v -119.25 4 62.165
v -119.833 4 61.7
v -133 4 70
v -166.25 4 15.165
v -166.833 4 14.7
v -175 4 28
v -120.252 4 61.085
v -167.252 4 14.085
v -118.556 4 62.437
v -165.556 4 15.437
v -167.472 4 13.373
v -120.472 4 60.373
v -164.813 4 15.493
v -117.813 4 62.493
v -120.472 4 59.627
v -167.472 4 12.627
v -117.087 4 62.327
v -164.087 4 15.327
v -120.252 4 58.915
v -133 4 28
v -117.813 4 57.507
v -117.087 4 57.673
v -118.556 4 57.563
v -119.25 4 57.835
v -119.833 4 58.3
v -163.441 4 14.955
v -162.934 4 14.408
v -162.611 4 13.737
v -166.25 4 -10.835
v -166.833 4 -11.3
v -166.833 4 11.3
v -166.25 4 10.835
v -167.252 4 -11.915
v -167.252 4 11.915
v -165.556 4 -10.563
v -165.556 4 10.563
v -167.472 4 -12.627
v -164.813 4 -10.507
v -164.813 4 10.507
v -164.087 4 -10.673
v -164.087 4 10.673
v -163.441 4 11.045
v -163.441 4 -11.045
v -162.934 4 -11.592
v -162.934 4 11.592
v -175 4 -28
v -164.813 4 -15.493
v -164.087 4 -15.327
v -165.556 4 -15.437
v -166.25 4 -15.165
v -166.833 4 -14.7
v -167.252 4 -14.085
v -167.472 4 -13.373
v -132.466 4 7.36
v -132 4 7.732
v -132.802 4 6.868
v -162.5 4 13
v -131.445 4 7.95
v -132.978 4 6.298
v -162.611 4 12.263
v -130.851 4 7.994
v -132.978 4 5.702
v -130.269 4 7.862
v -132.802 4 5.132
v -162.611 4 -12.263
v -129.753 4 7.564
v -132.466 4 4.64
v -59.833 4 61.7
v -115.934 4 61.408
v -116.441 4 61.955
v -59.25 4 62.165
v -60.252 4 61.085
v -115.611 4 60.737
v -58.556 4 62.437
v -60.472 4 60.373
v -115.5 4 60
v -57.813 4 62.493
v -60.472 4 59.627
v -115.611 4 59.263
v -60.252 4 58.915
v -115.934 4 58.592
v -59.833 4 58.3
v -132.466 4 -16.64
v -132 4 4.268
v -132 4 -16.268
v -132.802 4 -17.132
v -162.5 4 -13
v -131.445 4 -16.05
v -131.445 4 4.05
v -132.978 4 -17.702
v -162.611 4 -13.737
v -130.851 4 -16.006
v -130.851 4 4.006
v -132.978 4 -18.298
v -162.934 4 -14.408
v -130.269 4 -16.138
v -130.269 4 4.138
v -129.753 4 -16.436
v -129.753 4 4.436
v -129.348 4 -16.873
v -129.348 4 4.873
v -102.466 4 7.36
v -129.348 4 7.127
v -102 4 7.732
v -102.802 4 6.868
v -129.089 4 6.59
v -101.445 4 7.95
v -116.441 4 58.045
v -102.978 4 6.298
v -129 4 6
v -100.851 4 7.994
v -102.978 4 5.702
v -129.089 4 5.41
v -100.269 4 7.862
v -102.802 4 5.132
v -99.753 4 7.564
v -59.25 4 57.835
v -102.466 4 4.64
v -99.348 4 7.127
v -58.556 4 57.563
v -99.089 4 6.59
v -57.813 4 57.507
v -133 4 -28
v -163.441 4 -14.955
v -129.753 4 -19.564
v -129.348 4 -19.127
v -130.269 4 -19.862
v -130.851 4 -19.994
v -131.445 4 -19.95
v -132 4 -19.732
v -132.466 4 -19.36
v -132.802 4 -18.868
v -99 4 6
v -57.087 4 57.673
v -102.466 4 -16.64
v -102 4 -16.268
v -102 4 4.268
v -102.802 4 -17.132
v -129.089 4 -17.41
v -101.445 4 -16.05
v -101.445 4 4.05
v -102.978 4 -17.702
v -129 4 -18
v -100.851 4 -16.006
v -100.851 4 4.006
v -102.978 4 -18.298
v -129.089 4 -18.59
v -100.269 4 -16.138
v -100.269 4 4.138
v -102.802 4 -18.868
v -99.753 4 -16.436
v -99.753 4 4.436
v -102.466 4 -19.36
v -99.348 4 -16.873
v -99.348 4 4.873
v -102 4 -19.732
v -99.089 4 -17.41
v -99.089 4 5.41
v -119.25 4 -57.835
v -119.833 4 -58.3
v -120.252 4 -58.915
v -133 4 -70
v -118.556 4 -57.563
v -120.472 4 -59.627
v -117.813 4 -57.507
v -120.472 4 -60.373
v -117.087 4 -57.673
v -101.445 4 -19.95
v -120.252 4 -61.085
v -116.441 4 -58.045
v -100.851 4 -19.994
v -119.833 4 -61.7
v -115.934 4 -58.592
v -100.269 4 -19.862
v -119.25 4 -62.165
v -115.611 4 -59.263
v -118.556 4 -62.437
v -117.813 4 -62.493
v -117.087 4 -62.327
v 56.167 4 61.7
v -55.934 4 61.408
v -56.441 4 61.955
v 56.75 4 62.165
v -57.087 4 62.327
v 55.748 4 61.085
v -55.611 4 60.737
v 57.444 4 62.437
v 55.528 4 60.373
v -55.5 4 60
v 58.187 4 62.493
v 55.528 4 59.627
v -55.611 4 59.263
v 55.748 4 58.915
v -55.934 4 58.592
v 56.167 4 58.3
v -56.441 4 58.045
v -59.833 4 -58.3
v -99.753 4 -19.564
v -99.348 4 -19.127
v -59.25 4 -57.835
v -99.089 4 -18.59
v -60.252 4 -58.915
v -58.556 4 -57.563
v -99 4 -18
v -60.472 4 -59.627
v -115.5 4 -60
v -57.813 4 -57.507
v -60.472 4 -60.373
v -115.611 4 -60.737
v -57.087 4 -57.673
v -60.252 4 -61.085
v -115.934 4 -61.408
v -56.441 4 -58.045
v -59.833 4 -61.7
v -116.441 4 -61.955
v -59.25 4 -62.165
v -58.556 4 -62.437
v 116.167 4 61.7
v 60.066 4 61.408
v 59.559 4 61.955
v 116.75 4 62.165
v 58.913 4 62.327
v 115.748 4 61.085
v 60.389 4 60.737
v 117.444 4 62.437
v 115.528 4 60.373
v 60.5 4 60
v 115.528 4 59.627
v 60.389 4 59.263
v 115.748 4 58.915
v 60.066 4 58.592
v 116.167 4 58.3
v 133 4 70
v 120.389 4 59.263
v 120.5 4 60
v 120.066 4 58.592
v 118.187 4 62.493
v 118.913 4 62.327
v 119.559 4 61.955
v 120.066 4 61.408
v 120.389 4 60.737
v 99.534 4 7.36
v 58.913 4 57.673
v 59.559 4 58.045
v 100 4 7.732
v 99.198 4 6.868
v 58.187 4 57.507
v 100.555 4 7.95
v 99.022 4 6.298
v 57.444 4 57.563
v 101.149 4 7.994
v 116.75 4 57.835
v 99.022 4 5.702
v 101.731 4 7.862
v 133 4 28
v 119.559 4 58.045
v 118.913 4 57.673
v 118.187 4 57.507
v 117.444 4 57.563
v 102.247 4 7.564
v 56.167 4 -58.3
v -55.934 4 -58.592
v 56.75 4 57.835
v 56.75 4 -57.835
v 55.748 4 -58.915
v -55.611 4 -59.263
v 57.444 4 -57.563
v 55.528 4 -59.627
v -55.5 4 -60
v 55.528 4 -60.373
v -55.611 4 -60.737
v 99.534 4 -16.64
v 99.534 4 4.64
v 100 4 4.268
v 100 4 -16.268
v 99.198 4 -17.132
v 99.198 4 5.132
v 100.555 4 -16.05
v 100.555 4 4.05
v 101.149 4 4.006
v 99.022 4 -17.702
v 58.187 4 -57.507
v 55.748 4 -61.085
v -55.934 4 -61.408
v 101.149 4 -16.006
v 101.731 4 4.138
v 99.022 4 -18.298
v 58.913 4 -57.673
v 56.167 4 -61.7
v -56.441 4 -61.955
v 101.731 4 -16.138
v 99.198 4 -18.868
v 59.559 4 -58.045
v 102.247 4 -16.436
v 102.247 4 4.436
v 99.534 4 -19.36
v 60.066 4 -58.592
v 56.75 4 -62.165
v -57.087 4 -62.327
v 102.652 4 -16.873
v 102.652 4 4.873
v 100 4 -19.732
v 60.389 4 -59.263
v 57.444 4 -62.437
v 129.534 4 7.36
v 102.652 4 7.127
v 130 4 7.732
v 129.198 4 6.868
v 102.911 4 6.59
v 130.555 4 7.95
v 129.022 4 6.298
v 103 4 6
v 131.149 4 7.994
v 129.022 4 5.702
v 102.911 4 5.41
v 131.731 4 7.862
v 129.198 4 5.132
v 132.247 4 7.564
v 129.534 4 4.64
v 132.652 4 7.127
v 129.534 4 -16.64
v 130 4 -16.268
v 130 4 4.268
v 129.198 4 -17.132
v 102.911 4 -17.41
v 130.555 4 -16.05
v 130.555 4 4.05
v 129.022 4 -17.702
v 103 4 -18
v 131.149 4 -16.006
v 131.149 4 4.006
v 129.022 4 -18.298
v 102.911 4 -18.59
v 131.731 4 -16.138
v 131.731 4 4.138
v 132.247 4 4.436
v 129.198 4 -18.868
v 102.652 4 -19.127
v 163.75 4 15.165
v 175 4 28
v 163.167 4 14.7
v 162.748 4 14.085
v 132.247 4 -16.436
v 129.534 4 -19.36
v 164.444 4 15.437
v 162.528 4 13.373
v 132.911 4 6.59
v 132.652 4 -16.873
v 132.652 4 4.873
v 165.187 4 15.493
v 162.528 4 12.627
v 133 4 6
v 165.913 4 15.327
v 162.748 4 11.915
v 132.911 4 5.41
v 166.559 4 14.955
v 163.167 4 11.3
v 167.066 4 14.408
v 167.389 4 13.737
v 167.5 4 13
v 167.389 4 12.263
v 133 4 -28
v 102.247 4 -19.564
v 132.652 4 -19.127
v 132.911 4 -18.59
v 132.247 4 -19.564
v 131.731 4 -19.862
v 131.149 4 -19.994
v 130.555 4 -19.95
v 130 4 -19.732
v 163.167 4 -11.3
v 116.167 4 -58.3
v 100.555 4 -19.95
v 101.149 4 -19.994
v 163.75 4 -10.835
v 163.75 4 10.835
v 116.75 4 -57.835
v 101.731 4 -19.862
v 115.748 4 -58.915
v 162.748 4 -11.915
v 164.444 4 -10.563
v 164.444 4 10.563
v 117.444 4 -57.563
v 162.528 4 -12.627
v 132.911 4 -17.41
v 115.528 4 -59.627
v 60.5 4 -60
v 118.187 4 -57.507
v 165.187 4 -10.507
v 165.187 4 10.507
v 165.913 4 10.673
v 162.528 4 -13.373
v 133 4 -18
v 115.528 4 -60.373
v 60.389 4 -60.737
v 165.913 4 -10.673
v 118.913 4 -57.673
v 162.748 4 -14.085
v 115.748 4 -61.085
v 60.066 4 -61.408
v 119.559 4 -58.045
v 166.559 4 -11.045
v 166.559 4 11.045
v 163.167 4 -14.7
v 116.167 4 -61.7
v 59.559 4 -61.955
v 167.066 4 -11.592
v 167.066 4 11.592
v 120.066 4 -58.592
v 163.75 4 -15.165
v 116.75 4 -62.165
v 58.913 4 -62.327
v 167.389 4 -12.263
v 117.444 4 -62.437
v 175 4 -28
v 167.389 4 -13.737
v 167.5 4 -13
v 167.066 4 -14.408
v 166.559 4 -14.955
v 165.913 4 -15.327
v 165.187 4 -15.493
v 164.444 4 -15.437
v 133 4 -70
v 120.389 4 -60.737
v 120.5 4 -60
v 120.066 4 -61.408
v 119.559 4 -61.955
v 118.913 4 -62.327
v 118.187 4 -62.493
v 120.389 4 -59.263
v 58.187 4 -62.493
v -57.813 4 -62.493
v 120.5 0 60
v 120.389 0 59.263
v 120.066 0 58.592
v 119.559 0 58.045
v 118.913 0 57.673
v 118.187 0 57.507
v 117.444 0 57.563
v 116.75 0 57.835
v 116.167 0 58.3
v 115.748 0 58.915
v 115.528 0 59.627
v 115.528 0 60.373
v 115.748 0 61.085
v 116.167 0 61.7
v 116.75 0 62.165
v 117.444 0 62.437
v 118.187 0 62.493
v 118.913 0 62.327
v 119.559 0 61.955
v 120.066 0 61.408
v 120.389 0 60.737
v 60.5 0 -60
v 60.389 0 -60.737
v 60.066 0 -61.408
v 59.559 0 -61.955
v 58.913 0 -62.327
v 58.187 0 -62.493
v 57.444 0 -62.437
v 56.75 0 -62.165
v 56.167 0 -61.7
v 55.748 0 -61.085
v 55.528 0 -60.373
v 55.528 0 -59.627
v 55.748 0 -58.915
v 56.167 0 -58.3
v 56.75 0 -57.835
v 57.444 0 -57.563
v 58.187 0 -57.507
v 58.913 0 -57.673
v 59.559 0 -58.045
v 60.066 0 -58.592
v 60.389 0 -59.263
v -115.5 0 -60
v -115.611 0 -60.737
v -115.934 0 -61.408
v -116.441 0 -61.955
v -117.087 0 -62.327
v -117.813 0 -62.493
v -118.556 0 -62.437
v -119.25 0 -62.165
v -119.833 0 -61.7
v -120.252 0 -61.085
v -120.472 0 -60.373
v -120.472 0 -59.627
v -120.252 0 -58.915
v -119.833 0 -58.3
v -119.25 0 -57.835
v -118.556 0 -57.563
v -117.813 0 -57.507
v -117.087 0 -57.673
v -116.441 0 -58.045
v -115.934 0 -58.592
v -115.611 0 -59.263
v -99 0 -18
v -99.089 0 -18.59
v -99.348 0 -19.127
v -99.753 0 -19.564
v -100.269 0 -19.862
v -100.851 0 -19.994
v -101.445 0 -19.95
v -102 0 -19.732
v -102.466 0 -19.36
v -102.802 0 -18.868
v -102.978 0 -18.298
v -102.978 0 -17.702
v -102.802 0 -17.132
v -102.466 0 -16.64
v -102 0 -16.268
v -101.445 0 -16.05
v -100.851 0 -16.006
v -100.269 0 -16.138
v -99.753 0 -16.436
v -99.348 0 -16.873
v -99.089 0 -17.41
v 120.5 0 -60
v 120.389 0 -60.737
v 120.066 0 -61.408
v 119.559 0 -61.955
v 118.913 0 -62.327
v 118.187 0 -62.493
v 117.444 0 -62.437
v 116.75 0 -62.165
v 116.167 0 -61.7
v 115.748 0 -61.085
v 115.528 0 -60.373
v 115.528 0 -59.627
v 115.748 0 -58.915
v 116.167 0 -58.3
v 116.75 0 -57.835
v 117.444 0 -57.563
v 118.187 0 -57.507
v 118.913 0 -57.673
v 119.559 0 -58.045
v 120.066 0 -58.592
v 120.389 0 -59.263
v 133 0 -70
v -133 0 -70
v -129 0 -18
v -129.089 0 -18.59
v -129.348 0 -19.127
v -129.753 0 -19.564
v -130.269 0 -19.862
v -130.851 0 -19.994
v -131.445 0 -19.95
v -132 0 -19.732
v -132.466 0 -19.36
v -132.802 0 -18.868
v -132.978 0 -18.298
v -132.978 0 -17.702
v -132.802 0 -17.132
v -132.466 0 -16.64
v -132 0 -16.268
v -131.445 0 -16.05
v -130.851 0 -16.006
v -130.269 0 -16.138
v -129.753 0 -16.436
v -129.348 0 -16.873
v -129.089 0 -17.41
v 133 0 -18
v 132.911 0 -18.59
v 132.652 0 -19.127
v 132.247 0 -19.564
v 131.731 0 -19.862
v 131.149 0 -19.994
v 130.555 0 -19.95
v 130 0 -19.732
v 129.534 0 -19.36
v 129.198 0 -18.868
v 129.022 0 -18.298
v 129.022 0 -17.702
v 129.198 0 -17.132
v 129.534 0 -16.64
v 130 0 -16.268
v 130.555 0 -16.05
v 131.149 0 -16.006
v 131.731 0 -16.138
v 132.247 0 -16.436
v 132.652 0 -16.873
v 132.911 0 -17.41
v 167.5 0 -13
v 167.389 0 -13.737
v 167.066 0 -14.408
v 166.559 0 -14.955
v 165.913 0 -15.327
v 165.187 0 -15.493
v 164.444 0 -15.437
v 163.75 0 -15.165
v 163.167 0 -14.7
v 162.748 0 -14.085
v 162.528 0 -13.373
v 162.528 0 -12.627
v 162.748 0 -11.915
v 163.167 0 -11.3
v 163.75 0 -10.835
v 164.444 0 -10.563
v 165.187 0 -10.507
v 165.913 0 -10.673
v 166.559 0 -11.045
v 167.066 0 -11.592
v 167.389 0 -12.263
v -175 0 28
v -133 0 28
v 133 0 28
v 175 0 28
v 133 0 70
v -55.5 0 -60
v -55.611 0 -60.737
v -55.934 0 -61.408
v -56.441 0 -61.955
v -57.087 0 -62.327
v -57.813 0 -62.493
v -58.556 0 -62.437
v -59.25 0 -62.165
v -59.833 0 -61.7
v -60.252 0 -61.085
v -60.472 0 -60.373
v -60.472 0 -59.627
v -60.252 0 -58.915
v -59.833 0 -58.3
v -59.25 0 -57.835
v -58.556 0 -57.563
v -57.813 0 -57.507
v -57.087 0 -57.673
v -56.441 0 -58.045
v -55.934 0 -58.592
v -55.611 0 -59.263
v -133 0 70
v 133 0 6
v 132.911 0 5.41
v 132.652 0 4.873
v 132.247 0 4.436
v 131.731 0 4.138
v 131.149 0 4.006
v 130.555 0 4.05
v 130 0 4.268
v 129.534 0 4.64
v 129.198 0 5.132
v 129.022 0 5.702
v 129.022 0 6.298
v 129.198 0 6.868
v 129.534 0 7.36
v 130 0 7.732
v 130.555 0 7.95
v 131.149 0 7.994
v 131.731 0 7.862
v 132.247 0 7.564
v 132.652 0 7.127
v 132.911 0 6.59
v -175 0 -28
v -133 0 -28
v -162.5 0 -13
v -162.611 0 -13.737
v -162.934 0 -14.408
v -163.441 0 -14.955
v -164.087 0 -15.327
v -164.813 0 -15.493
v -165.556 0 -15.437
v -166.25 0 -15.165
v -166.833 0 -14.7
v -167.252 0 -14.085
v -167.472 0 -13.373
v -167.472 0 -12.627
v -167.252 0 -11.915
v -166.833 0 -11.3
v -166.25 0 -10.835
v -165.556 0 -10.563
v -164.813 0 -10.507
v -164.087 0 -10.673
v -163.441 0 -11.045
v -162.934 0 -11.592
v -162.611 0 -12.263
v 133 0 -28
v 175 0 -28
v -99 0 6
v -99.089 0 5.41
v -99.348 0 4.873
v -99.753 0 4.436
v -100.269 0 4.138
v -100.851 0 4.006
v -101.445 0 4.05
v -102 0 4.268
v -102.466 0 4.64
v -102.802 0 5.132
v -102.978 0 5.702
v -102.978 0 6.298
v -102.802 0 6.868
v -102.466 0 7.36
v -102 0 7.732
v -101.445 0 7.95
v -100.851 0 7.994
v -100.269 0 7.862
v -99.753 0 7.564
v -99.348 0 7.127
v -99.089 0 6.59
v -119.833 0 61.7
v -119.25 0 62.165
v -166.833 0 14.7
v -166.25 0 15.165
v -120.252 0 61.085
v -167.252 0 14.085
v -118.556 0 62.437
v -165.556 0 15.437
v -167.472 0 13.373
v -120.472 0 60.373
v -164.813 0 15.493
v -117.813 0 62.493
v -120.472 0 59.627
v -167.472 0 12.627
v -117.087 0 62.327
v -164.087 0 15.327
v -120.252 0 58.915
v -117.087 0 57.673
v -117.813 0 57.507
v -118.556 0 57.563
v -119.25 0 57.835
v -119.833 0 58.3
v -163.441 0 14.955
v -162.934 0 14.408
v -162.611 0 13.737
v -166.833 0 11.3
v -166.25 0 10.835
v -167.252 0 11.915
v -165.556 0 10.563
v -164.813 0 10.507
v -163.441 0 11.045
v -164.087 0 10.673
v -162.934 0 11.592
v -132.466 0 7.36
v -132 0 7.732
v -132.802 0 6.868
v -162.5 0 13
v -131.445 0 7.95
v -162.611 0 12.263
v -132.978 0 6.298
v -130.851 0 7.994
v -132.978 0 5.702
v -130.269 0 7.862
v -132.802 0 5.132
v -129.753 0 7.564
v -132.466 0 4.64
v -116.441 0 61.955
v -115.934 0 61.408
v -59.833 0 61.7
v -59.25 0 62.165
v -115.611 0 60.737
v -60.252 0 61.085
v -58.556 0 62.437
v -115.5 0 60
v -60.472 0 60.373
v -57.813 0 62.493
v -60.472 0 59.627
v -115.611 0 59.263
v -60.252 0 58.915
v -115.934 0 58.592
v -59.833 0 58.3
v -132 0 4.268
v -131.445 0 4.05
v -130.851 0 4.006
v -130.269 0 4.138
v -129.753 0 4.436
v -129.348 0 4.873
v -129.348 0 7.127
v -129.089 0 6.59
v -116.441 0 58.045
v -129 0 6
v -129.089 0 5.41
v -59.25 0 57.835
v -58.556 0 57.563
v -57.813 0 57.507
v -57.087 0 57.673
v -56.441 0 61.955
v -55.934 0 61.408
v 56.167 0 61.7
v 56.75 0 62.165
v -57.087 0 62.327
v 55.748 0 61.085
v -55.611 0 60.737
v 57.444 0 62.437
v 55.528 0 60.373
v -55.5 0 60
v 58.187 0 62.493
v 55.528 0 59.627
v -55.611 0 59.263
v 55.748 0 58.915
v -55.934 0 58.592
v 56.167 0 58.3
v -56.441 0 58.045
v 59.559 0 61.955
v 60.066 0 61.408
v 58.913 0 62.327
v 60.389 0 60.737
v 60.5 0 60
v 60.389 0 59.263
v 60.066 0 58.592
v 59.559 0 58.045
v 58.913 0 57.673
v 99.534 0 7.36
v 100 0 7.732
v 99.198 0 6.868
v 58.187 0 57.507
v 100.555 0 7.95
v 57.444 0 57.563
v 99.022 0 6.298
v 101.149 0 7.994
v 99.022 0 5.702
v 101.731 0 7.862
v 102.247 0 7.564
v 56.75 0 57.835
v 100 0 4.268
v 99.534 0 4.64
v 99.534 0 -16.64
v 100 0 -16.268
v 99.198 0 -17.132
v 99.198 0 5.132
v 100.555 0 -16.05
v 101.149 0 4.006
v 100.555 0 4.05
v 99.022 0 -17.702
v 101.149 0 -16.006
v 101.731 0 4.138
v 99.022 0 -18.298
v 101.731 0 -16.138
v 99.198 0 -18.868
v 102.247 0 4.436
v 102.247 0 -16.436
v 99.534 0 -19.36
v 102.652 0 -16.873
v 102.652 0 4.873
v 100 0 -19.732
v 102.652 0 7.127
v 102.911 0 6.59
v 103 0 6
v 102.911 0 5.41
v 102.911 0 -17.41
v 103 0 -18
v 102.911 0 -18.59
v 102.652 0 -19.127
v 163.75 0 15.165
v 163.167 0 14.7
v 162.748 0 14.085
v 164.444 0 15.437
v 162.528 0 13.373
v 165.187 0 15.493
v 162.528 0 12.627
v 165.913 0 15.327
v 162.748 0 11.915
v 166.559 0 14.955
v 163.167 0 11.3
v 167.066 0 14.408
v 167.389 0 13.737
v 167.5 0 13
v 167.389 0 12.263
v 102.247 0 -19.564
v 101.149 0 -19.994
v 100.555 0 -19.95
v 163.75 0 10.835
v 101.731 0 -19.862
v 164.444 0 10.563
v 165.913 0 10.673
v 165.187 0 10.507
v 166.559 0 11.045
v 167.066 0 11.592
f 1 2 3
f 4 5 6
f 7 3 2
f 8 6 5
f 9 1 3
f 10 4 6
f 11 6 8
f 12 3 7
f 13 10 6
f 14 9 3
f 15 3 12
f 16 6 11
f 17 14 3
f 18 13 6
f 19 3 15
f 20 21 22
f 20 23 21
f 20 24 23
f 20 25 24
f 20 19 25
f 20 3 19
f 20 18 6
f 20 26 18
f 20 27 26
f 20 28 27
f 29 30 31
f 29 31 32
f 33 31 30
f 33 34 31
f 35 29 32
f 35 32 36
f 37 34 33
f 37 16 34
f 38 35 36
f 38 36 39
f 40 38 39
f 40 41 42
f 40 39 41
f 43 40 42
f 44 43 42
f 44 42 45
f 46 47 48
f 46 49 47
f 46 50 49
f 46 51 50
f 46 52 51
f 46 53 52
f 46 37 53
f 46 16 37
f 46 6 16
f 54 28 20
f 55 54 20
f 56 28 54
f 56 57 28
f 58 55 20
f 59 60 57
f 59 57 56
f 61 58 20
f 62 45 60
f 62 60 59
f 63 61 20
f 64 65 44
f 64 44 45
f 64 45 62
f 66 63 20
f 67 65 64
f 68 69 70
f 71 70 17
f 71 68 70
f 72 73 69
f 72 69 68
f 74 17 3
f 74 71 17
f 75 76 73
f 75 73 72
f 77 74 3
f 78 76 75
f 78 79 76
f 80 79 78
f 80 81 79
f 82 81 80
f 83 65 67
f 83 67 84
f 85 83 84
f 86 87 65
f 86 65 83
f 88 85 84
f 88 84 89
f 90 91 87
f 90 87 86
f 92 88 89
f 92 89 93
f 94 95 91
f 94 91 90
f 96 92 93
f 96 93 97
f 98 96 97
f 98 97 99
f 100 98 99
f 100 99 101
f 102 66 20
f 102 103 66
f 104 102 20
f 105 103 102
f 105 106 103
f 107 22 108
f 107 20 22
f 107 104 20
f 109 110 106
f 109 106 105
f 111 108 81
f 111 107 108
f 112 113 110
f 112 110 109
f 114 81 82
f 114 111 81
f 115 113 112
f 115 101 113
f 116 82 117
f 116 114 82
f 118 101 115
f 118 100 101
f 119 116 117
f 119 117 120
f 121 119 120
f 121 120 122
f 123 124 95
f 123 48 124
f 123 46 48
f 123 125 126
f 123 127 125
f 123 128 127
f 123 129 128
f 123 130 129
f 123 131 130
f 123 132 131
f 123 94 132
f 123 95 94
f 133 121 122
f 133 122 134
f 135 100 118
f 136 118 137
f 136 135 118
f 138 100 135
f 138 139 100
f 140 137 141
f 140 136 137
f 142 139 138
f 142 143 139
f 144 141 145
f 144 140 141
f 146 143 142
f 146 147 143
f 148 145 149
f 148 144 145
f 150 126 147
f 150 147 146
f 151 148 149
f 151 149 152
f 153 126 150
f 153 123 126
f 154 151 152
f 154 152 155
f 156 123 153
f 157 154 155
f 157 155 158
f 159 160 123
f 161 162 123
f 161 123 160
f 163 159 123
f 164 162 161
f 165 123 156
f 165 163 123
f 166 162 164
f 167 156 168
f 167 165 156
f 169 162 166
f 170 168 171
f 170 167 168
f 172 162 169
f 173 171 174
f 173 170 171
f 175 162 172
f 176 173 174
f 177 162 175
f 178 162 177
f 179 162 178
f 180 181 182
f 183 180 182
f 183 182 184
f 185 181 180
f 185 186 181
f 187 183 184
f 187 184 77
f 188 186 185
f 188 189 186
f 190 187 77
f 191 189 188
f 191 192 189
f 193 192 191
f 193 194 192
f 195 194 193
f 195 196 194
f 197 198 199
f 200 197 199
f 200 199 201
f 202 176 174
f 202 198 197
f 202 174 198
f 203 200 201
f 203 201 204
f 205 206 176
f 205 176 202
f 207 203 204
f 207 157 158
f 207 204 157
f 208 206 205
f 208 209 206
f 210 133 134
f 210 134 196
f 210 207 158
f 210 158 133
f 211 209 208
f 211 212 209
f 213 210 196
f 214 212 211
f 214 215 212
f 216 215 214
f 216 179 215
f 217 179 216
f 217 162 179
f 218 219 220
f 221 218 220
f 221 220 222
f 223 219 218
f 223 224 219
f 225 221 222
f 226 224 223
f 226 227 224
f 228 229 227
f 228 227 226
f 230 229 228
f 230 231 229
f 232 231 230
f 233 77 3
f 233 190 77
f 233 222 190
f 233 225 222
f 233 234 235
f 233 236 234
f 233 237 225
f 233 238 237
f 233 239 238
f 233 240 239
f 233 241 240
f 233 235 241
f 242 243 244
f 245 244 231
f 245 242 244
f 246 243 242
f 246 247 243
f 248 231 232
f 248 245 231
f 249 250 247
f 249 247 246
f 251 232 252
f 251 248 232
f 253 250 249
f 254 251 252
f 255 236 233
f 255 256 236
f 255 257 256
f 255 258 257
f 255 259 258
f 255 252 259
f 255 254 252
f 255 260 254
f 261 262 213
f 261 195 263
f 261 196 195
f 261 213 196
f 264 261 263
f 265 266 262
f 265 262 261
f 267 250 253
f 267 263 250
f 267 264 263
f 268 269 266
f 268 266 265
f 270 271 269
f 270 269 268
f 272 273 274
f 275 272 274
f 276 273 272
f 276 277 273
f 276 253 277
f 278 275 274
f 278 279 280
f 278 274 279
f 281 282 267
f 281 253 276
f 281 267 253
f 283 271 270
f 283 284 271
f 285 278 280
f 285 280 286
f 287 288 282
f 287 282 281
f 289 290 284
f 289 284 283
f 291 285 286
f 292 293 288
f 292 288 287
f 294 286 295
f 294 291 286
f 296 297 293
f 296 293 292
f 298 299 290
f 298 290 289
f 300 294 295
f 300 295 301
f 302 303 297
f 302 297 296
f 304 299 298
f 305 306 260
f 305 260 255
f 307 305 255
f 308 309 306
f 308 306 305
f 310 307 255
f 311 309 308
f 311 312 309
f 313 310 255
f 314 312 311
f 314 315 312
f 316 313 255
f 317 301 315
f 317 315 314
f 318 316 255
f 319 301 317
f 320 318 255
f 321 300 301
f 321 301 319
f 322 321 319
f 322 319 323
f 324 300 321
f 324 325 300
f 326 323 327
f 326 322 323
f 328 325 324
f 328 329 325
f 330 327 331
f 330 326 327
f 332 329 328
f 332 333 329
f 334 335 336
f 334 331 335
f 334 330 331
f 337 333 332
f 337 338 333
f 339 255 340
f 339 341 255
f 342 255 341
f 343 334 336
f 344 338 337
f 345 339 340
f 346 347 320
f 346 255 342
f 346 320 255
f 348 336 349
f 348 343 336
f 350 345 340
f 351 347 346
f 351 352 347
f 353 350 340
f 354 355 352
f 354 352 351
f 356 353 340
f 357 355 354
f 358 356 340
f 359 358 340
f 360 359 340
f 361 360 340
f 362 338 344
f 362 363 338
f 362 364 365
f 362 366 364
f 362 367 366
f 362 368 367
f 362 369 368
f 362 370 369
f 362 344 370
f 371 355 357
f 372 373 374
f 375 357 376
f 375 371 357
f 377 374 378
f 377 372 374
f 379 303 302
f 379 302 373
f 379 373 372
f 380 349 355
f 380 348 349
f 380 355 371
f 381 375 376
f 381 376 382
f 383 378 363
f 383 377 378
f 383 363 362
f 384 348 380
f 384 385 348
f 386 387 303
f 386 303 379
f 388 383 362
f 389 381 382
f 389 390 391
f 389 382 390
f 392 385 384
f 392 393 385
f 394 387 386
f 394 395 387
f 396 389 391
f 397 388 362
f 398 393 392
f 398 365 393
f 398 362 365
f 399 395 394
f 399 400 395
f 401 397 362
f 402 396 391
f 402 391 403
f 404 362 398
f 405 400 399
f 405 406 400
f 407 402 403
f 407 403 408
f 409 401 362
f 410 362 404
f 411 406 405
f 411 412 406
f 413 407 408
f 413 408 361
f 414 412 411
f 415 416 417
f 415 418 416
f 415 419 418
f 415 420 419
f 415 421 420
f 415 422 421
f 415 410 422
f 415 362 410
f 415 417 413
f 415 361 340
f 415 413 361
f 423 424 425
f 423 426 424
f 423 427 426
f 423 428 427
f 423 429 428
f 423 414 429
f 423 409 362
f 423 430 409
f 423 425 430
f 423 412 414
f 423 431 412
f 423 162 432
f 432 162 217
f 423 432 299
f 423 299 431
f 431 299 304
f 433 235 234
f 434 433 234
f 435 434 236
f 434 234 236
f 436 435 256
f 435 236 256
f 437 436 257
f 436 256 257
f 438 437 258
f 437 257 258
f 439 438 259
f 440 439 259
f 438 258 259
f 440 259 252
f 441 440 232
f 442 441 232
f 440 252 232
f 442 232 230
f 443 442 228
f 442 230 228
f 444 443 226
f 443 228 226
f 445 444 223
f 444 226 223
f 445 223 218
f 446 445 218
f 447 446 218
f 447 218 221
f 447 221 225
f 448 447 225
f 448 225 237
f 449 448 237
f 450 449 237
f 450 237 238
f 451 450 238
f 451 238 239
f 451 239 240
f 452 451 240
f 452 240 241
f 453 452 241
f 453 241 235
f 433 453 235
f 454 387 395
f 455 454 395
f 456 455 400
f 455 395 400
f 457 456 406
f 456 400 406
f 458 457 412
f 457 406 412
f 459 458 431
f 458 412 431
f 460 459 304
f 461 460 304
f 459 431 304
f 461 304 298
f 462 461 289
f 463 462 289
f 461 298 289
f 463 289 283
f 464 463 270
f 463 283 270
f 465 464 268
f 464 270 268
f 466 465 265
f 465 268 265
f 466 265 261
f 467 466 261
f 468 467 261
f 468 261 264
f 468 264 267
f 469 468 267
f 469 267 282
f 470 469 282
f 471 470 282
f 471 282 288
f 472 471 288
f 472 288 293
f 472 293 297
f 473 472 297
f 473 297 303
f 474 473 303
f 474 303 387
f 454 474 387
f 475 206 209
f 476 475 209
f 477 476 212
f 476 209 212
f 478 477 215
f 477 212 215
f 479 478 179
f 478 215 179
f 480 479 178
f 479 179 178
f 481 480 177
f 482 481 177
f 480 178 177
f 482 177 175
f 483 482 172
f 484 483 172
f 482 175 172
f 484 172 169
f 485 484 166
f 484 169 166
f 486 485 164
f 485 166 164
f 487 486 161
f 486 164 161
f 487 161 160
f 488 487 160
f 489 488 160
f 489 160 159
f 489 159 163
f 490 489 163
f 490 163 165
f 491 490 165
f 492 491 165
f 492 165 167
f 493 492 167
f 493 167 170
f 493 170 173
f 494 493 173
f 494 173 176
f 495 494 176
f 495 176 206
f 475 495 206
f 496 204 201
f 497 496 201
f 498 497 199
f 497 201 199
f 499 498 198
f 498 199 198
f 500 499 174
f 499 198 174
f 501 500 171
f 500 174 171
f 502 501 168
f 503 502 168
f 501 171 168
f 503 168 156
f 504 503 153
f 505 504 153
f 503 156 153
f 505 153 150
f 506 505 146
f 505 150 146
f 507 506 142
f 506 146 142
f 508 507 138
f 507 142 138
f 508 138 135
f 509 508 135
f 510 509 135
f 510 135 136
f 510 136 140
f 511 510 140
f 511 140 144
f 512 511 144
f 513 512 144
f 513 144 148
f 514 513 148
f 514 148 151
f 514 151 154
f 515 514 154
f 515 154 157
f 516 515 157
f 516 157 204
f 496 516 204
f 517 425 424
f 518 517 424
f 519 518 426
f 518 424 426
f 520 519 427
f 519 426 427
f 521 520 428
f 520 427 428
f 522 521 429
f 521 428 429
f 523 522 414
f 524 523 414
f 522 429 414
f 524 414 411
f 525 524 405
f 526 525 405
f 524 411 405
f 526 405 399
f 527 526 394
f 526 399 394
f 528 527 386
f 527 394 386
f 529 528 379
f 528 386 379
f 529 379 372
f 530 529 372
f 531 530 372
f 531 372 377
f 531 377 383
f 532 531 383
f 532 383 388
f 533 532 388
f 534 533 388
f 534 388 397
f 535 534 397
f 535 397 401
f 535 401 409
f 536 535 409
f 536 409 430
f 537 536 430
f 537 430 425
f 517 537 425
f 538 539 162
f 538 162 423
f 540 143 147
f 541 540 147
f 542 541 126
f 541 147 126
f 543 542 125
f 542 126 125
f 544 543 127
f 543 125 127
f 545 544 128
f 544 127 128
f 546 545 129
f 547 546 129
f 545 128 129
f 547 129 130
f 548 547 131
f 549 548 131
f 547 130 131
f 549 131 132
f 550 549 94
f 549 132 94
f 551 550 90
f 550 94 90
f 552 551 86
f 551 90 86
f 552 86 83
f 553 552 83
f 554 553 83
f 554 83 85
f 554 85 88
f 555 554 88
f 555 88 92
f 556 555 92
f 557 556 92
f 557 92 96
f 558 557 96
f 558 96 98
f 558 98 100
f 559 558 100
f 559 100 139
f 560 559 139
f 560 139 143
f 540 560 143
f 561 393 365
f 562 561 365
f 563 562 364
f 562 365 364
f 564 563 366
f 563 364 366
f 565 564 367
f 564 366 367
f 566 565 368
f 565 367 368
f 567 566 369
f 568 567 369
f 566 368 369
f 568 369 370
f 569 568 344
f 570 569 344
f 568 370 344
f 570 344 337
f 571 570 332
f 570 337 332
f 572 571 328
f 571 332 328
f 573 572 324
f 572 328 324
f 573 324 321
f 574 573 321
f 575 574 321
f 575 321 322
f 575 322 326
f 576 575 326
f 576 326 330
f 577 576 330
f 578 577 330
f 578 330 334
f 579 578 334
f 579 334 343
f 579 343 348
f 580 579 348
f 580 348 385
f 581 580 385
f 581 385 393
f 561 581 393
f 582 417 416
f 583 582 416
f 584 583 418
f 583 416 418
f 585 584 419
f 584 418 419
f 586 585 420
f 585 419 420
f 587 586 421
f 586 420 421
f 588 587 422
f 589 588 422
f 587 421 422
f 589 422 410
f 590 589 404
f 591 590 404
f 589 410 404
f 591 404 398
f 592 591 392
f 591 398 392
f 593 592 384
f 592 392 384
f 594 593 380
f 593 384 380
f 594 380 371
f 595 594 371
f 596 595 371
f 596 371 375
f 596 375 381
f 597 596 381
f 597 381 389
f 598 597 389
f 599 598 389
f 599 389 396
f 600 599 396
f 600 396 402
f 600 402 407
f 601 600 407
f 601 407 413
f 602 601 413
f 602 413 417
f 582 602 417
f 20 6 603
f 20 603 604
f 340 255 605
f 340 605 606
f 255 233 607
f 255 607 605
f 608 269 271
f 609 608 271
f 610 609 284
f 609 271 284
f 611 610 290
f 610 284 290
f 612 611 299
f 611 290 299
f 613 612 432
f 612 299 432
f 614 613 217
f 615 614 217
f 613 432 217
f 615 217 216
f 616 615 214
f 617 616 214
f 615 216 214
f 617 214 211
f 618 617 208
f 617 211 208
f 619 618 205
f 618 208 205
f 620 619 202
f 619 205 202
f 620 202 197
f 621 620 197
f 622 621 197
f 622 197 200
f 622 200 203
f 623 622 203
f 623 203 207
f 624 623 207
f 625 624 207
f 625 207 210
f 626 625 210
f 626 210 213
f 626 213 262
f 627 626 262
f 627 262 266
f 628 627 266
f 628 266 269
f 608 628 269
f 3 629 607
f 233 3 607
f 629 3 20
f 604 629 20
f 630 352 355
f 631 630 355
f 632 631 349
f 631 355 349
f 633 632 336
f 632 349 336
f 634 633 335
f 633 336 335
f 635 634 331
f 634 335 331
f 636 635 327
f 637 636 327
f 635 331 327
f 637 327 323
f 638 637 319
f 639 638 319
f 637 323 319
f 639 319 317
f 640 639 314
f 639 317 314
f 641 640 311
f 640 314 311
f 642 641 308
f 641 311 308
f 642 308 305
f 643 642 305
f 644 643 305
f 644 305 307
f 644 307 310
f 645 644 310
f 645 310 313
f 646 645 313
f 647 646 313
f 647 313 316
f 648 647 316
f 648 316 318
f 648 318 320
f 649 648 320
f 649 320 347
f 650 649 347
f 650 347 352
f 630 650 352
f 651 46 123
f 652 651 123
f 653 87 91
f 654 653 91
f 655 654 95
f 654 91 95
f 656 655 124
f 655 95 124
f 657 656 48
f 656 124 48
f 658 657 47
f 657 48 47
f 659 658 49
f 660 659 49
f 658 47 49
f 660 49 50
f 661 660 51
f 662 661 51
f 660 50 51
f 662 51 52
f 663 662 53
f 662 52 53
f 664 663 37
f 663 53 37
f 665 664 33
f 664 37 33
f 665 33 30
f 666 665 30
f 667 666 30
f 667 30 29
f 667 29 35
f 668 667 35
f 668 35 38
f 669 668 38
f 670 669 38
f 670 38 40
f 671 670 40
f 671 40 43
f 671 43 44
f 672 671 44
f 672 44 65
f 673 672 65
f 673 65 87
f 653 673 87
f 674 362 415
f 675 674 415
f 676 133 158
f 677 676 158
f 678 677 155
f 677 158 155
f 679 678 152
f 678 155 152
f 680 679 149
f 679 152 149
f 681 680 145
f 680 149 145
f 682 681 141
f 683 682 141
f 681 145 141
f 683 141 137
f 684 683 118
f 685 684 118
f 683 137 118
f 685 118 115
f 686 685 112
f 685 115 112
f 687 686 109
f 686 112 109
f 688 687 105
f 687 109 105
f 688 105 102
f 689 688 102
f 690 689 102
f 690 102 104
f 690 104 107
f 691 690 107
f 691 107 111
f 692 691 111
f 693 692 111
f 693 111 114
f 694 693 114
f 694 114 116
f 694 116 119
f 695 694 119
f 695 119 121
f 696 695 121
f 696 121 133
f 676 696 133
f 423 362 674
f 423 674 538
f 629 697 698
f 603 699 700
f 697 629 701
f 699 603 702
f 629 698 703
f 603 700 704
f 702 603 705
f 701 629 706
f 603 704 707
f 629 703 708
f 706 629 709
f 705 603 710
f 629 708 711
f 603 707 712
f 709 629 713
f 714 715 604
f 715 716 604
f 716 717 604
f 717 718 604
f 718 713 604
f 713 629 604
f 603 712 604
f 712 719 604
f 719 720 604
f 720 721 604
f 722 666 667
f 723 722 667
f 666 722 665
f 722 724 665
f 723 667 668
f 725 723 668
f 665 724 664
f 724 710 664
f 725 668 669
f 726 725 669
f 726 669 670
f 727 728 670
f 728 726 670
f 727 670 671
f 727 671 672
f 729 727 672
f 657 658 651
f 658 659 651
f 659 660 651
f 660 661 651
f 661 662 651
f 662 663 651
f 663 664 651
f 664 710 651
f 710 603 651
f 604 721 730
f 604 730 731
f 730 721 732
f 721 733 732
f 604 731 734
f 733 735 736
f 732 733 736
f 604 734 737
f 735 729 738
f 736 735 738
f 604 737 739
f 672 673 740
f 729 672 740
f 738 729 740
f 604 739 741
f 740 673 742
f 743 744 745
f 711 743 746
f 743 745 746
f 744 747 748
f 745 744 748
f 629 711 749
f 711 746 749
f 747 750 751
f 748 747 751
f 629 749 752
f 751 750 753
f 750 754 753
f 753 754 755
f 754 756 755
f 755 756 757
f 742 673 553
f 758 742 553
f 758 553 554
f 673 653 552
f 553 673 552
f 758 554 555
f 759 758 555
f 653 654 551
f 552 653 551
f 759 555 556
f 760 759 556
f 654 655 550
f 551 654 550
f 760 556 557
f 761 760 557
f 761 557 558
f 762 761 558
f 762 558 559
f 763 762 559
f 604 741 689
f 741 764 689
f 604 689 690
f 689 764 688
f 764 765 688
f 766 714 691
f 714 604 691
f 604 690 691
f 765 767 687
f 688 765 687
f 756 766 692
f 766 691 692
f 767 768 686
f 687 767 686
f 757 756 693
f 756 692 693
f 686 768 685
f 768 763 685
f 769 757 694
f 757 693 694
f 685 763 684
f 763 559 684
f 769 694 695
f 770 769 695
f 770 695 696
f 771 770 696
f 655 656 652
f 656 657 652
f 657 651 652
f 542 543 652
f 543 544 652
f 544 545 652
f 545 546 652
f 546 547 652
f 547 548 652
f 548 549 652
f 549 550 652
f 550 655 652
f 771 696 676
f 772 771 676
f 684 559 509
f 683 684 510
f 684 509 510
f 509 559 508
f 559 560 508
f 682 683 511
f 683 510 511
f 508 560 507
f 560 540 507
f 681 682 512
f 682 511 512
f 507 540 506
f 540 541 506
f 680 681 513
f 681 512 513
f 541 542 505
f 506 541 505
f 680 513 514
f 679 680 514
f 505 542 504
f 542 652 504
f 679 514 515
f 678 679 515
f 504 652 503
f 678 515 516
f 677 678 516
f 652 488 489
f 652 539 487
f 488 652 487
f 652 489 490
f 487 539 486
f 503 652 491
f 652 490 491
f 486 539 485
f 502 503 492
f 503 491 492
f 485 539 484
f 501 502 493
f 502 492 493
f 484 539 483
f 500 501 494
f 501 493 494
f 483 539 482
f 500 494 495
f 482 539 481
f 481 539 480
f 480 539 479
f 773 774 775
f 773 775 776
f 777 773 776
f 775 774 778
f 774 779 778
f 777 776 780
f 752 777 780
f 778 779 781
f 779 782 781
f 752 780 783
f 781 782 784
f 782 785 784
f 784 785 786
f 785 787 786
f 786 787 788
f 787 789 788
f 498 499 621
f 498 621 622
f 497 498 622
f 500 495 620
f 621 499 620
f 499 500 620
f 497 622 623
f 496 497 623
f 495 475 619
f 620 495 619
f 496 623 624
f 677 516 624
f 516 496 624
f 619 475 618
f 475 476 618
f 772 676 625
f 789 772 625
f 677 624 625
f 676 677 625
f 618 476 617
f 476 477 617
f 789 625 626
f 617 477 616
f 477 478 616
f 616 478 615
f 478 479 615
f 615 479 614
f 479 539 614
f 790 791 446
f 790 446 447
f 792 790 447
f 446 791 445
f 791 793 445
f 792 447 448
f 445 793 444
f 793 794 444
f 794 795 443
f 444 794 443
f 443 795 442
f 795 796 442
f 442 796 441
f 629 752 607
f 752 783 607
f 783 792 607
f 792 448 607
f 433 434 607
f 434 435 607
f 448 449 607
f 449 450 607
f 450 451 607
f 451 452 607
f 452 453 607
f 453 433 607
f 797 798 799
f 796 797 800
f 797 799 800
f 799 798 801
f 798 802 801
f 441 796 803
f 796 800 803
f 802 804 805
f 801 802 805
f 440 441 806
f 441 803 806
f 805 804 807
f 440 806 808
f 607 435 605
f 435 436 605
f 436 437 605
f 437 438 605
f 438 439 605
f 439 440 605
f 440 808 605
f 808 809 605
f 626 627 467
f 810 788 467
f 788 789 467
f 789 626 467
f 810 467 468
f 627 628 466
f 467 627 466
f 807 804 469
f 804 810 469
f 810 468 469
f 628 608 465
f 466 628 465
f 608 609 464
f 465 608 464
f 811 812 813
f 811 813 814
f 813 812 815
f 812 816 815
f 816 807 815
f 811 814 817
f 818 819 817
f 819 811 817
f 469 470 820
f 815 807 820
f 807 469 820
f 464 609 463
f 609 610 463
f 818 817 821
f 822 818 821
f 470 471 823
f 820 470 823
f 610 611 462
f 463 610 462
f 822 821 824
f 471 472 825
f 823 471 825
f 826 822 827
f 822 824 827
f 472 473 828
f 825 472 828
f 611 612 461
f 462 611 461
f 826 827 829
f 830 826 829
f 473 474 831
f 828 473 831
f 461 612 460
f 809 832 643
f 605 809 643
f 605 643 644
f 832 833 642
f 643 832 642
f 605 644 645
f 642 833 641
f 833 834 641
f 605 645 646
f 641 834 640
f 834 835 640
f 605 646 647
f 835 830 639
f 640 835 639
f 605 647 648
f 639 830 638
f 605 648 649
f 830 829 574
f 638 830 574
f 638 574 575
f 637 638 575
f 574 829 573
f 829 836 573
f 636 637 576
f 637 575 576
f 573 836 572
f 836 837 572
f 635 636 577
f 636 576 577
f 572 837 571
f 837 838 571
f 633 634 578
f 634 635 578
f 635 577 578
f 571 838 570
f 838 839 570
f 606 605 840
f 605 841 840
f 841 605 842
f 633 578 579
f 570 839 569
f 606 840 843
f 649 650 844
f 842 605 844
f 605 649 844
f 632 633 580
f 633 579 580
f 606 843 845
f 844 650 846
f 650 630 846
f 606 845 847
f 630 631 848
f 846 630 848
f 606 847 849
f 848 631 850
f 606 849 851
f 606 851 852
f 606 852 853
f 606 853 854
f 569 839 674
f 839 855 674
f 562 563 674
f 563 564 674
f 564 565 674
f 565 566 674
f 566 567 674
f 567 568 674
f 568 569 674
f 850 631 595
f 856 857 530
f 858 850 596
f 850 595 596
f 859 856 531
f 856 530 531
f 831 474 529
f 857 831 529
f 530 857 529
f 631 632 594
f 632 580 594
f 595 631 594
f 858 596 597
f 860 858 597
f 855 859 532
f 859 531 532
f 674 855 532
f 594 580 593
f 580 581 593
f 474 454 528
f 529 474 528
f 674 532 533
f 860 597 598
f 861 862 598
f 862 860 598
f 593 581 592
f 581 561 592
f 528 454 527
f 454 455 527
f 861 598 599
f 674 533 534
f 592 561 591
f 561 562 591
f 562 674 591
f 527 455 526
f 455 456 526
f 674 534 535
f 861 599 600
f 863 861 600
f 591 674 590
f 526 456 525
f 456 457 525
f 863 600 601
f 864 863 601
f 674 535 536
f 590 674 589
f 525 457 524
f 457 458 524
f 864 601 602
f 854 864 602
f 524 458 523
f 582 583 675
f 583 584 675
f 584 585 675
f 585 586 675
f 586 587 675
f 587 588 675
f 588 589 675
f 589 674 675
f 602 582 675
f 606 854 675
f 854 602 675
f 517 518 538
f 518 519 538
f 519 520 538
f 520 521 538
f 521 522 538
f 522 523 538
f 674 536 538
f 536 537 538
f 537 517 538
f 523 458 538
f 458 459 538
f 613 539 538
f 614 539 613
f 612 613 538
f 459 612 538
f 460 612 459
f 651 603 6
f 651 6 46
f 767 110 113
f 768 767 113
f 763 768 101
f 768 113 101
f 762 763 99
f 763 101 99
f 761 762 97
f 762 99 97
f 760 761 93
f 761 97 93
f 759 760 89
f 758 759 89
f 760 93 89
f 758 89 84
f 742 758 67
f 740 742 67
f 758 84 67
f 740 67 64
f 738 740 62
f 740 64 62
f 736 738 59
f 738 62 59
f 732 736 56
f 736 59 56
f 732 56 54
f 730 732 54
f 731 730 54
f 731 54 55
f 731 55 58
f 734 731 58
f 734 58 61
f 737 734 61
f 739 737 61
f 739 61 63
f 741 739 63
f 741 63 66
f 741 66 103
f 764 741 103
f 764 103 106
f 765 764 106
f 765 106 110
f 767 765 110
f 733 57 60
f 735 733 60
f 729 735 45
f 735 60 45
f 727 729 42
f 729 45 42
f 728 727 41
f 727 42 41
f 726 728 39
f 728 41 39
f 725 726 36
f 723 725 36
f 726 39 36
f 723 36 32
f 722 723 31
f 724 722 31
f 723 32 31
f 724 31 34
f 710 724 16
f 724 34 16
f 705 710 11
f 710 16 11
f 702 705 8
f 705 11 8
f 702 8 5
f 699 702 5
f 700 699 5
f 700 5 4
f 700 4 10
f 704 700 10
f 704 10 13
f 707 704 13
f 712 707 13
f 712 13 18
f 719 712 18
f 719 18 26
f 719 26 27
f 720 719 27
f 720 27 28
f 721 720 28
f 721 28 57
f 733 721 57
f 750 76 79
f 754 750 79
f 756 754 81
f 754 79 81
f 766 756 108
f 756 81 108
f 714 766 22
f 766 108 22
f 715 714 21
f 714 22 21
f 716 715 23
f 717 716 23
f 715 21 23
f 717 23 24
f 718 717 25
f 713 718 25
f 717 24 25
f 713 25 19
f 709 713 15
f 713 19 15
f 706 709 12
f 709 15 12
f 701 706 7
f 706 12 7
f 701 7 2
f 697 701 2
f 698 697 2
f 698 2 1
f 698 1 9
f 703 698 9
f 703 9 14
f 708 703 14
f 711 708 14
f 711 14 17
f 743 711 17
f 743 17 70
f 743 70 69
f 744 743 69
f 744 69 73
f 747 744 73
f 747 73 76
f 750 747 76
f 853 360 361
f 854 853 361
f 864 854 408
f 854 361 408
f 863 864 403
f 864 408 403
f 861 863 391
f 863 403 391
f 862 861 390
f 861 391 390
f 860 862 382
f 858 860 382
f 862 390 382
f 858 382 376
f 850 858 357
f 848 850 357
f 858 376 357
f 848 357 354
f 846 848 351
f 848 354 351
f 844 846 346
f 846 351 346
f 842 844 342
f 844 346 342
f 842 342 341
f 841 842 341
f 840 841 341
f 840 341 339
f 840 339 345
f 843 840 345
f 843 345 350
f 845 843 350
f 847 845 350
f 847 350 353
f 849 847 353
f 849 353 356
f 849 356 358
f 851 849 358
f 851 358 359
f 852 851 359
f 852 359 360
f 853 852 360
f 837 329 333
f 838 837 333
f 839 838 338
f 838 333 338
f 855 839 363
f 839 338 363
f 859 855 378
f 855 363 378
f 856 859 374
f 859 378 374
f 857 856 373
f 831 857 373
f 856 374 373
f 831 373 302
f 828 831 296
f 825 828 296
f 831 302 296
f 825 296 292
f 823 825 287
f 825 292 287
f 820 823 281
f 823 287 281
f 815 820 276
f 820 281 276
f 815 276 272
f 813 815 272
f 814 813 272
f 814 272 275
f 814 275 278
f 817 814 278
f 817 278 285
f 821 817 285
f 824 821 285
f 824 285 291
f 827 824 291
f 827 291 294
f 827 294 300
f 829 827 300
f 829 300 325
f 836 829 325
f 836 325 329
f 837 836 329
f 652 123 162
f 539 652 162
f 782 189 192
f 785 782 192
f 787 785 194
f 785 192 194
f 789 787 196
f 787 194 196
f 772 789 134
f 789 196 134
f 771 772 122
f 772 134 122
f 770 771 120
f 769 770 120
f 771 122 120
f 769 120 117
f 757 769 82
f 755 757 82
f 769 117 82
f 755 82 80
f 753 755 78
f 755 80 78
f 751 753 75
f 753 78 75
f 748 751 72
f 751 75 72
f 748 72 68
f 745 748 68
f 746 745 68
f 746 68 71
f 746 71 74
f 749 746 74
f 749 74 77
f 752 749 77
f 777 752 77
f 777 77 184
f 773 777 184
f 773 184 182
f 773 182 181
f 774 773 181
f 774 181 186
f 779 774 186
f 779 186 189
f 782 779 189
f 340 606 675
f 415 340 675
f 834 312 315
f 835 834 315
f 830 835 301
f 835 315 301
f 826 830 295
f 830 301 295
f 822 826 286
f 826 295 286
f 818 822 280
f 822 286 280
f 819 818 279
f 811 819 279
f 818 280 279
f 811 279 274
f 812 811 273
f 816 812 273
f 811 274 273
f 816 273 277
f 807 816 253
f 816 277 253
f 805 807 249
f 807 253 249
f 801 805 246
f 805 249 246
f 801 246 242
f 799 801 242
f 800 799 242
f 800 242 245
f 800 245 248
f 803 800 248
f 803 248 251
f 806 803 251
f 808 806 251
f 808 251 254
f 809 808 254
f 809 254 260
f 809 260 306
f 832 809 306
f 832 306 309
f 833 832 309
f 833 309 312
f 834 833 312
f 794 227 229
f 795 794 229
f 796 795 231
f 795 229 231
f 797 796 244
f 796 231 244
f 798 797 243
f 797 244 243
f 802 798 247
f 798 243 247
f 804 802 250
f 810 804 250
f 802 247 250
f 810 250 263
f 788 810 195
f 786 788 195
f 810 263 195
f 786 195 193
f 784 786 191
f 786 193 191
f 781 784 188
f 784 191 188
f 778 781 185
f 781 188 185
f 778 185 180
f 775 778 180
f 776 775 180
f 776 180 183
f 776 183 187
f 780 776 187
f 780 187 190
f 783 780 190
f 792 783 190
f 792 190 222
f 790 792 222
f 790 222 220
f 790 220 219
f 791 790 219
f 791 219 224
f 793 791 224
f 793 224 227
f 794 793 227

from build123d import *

# Parameters (mm, degrees)
SKETCH1_W           = 350
SKETCH1_H           = 140
BOSS_EXTRUDE1_DEPTH = 4
SKETCH2_R           = 2.5
SKETCH2_W           = 42
SKETCH2_H           = 42
CUT_EXTRUDE1_DEPTH  = 5
SKETCH3_R           = 2
CUT_EXTRUDE2_DEPTH  = 10


with BuildPart() as part:
    # Sketch1 → Boss-Extrude1 (new body)
    with BuildSketch(Plane(origin=(0, 0, 0), x_dir=(1, 0, 0), z_dir=(0, 1, 0))):
        Rectangle(SKETCH1_W, SKETCH1_H)
    extrude(amount=BOSS_EXTRUDE1_DEPTH)

    # Sketch2 → Cut-Extrude1 (cut, through all)
    with BuildSketch(Plane(origin=(0, 4, 0), x_dir=(1, 0, 0), z_dir=(0, 1, 0))):
        with Locations((-165, 13)):
            Circle(SKETCH2_R)
        with Locations((-165, -13)):
            Circle(SKETCH2_R)
        with Locations((165, -13)):
            Circle(SKETCH2_R)
        with Locations((165, 13)):
            Circle(SKETCH2_R)
        with Locations((-118, 60)):
            Circle(SKETCH2_R)
        with Locations((-58, 60)):
            Circle(SKETCH2_R)
        with Locations((58, 60)):
            Circle(SKETCH2_R)
        with Locations((118, 60)):
            Circle(SKETCH2_R)
        with Locations((118, -60)):
            Circle(SKETCH2_R)
        with Locations((58, -60)):
            Circle(SKETCH2_R)
        with Locations((-58, -60)):
            Circle(SKETCH2_R)
        with Locations((-118, -60)):
            Circle(SKETCH2_R)
        with Locations((-154, -49)):
            Rectangle(SKETCH2_W, SKETCH2_H)
        with Locations((154, -49)):
            Rectangle(SKETCH2_W, SKETCH2_H)
        with Locations((154, 49)):
            Rectangle(SKETCH2_W, SKETCH2_H)
        with Locations((-154, 49)):
            Rectangle(SKETCH2_W, SKETCH2_H)
    extrude(amount=-CUT_EXTRUDE1_DEPTH, mode=Mode.SUBTRACT)

    # Sketch3 → Cut-Extrude2 (cut)
    with BuildSketch(Plane(origin=(0, 4, 0), x_dir=(1, 0, 0), z_dir=(0, 1, 0))):
        with Locations((-131, -6)):
            Circle(SKETCH3_R)
        with Locations((-101, -6)):
            Circle(SKETCH3_R)
        with Locations((-101, 18)):
            Circle(SKETCH3_R)
        with Locations((101, -6)):
            Circle(SKETCH3_R)
        with Locations((-131, 18)):
            Circle(SKETCH3_R)
        with Locations((101, 18)):
            Circle(SKETCH3_R)
        with Locations((131, 18)):
            Circle(SKETCH3_R)
        with Locations((131, -6)):
            Circle(SKETCH3_R)
    extrude(amount=-CUT_EXTRUDE2_DEPTH, mode=Mode.SUBTRACT)


solid = part.part
